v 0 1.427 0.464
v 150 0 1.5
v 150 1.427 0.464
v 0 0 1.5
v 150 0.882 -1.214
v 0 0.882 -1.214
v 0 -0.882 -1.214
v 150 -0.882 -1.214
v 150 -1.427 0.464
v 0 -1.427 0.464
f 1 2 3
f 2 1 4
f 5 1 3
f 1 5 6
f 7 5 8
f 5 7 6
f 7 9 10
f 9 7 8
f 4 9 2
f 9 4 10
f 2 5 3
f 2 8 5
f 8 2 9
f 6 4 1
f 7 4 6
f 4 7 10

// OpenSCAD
Us(150);


vantaDia = 3;

module Us(usLen) {

    rotate([0, 180, 0])
    translate([-usLen, 0, 0])
    {


      rotate([0, 90, 0])
      cylinder(h=usLen, r=vantaDia/2);

    }
}
